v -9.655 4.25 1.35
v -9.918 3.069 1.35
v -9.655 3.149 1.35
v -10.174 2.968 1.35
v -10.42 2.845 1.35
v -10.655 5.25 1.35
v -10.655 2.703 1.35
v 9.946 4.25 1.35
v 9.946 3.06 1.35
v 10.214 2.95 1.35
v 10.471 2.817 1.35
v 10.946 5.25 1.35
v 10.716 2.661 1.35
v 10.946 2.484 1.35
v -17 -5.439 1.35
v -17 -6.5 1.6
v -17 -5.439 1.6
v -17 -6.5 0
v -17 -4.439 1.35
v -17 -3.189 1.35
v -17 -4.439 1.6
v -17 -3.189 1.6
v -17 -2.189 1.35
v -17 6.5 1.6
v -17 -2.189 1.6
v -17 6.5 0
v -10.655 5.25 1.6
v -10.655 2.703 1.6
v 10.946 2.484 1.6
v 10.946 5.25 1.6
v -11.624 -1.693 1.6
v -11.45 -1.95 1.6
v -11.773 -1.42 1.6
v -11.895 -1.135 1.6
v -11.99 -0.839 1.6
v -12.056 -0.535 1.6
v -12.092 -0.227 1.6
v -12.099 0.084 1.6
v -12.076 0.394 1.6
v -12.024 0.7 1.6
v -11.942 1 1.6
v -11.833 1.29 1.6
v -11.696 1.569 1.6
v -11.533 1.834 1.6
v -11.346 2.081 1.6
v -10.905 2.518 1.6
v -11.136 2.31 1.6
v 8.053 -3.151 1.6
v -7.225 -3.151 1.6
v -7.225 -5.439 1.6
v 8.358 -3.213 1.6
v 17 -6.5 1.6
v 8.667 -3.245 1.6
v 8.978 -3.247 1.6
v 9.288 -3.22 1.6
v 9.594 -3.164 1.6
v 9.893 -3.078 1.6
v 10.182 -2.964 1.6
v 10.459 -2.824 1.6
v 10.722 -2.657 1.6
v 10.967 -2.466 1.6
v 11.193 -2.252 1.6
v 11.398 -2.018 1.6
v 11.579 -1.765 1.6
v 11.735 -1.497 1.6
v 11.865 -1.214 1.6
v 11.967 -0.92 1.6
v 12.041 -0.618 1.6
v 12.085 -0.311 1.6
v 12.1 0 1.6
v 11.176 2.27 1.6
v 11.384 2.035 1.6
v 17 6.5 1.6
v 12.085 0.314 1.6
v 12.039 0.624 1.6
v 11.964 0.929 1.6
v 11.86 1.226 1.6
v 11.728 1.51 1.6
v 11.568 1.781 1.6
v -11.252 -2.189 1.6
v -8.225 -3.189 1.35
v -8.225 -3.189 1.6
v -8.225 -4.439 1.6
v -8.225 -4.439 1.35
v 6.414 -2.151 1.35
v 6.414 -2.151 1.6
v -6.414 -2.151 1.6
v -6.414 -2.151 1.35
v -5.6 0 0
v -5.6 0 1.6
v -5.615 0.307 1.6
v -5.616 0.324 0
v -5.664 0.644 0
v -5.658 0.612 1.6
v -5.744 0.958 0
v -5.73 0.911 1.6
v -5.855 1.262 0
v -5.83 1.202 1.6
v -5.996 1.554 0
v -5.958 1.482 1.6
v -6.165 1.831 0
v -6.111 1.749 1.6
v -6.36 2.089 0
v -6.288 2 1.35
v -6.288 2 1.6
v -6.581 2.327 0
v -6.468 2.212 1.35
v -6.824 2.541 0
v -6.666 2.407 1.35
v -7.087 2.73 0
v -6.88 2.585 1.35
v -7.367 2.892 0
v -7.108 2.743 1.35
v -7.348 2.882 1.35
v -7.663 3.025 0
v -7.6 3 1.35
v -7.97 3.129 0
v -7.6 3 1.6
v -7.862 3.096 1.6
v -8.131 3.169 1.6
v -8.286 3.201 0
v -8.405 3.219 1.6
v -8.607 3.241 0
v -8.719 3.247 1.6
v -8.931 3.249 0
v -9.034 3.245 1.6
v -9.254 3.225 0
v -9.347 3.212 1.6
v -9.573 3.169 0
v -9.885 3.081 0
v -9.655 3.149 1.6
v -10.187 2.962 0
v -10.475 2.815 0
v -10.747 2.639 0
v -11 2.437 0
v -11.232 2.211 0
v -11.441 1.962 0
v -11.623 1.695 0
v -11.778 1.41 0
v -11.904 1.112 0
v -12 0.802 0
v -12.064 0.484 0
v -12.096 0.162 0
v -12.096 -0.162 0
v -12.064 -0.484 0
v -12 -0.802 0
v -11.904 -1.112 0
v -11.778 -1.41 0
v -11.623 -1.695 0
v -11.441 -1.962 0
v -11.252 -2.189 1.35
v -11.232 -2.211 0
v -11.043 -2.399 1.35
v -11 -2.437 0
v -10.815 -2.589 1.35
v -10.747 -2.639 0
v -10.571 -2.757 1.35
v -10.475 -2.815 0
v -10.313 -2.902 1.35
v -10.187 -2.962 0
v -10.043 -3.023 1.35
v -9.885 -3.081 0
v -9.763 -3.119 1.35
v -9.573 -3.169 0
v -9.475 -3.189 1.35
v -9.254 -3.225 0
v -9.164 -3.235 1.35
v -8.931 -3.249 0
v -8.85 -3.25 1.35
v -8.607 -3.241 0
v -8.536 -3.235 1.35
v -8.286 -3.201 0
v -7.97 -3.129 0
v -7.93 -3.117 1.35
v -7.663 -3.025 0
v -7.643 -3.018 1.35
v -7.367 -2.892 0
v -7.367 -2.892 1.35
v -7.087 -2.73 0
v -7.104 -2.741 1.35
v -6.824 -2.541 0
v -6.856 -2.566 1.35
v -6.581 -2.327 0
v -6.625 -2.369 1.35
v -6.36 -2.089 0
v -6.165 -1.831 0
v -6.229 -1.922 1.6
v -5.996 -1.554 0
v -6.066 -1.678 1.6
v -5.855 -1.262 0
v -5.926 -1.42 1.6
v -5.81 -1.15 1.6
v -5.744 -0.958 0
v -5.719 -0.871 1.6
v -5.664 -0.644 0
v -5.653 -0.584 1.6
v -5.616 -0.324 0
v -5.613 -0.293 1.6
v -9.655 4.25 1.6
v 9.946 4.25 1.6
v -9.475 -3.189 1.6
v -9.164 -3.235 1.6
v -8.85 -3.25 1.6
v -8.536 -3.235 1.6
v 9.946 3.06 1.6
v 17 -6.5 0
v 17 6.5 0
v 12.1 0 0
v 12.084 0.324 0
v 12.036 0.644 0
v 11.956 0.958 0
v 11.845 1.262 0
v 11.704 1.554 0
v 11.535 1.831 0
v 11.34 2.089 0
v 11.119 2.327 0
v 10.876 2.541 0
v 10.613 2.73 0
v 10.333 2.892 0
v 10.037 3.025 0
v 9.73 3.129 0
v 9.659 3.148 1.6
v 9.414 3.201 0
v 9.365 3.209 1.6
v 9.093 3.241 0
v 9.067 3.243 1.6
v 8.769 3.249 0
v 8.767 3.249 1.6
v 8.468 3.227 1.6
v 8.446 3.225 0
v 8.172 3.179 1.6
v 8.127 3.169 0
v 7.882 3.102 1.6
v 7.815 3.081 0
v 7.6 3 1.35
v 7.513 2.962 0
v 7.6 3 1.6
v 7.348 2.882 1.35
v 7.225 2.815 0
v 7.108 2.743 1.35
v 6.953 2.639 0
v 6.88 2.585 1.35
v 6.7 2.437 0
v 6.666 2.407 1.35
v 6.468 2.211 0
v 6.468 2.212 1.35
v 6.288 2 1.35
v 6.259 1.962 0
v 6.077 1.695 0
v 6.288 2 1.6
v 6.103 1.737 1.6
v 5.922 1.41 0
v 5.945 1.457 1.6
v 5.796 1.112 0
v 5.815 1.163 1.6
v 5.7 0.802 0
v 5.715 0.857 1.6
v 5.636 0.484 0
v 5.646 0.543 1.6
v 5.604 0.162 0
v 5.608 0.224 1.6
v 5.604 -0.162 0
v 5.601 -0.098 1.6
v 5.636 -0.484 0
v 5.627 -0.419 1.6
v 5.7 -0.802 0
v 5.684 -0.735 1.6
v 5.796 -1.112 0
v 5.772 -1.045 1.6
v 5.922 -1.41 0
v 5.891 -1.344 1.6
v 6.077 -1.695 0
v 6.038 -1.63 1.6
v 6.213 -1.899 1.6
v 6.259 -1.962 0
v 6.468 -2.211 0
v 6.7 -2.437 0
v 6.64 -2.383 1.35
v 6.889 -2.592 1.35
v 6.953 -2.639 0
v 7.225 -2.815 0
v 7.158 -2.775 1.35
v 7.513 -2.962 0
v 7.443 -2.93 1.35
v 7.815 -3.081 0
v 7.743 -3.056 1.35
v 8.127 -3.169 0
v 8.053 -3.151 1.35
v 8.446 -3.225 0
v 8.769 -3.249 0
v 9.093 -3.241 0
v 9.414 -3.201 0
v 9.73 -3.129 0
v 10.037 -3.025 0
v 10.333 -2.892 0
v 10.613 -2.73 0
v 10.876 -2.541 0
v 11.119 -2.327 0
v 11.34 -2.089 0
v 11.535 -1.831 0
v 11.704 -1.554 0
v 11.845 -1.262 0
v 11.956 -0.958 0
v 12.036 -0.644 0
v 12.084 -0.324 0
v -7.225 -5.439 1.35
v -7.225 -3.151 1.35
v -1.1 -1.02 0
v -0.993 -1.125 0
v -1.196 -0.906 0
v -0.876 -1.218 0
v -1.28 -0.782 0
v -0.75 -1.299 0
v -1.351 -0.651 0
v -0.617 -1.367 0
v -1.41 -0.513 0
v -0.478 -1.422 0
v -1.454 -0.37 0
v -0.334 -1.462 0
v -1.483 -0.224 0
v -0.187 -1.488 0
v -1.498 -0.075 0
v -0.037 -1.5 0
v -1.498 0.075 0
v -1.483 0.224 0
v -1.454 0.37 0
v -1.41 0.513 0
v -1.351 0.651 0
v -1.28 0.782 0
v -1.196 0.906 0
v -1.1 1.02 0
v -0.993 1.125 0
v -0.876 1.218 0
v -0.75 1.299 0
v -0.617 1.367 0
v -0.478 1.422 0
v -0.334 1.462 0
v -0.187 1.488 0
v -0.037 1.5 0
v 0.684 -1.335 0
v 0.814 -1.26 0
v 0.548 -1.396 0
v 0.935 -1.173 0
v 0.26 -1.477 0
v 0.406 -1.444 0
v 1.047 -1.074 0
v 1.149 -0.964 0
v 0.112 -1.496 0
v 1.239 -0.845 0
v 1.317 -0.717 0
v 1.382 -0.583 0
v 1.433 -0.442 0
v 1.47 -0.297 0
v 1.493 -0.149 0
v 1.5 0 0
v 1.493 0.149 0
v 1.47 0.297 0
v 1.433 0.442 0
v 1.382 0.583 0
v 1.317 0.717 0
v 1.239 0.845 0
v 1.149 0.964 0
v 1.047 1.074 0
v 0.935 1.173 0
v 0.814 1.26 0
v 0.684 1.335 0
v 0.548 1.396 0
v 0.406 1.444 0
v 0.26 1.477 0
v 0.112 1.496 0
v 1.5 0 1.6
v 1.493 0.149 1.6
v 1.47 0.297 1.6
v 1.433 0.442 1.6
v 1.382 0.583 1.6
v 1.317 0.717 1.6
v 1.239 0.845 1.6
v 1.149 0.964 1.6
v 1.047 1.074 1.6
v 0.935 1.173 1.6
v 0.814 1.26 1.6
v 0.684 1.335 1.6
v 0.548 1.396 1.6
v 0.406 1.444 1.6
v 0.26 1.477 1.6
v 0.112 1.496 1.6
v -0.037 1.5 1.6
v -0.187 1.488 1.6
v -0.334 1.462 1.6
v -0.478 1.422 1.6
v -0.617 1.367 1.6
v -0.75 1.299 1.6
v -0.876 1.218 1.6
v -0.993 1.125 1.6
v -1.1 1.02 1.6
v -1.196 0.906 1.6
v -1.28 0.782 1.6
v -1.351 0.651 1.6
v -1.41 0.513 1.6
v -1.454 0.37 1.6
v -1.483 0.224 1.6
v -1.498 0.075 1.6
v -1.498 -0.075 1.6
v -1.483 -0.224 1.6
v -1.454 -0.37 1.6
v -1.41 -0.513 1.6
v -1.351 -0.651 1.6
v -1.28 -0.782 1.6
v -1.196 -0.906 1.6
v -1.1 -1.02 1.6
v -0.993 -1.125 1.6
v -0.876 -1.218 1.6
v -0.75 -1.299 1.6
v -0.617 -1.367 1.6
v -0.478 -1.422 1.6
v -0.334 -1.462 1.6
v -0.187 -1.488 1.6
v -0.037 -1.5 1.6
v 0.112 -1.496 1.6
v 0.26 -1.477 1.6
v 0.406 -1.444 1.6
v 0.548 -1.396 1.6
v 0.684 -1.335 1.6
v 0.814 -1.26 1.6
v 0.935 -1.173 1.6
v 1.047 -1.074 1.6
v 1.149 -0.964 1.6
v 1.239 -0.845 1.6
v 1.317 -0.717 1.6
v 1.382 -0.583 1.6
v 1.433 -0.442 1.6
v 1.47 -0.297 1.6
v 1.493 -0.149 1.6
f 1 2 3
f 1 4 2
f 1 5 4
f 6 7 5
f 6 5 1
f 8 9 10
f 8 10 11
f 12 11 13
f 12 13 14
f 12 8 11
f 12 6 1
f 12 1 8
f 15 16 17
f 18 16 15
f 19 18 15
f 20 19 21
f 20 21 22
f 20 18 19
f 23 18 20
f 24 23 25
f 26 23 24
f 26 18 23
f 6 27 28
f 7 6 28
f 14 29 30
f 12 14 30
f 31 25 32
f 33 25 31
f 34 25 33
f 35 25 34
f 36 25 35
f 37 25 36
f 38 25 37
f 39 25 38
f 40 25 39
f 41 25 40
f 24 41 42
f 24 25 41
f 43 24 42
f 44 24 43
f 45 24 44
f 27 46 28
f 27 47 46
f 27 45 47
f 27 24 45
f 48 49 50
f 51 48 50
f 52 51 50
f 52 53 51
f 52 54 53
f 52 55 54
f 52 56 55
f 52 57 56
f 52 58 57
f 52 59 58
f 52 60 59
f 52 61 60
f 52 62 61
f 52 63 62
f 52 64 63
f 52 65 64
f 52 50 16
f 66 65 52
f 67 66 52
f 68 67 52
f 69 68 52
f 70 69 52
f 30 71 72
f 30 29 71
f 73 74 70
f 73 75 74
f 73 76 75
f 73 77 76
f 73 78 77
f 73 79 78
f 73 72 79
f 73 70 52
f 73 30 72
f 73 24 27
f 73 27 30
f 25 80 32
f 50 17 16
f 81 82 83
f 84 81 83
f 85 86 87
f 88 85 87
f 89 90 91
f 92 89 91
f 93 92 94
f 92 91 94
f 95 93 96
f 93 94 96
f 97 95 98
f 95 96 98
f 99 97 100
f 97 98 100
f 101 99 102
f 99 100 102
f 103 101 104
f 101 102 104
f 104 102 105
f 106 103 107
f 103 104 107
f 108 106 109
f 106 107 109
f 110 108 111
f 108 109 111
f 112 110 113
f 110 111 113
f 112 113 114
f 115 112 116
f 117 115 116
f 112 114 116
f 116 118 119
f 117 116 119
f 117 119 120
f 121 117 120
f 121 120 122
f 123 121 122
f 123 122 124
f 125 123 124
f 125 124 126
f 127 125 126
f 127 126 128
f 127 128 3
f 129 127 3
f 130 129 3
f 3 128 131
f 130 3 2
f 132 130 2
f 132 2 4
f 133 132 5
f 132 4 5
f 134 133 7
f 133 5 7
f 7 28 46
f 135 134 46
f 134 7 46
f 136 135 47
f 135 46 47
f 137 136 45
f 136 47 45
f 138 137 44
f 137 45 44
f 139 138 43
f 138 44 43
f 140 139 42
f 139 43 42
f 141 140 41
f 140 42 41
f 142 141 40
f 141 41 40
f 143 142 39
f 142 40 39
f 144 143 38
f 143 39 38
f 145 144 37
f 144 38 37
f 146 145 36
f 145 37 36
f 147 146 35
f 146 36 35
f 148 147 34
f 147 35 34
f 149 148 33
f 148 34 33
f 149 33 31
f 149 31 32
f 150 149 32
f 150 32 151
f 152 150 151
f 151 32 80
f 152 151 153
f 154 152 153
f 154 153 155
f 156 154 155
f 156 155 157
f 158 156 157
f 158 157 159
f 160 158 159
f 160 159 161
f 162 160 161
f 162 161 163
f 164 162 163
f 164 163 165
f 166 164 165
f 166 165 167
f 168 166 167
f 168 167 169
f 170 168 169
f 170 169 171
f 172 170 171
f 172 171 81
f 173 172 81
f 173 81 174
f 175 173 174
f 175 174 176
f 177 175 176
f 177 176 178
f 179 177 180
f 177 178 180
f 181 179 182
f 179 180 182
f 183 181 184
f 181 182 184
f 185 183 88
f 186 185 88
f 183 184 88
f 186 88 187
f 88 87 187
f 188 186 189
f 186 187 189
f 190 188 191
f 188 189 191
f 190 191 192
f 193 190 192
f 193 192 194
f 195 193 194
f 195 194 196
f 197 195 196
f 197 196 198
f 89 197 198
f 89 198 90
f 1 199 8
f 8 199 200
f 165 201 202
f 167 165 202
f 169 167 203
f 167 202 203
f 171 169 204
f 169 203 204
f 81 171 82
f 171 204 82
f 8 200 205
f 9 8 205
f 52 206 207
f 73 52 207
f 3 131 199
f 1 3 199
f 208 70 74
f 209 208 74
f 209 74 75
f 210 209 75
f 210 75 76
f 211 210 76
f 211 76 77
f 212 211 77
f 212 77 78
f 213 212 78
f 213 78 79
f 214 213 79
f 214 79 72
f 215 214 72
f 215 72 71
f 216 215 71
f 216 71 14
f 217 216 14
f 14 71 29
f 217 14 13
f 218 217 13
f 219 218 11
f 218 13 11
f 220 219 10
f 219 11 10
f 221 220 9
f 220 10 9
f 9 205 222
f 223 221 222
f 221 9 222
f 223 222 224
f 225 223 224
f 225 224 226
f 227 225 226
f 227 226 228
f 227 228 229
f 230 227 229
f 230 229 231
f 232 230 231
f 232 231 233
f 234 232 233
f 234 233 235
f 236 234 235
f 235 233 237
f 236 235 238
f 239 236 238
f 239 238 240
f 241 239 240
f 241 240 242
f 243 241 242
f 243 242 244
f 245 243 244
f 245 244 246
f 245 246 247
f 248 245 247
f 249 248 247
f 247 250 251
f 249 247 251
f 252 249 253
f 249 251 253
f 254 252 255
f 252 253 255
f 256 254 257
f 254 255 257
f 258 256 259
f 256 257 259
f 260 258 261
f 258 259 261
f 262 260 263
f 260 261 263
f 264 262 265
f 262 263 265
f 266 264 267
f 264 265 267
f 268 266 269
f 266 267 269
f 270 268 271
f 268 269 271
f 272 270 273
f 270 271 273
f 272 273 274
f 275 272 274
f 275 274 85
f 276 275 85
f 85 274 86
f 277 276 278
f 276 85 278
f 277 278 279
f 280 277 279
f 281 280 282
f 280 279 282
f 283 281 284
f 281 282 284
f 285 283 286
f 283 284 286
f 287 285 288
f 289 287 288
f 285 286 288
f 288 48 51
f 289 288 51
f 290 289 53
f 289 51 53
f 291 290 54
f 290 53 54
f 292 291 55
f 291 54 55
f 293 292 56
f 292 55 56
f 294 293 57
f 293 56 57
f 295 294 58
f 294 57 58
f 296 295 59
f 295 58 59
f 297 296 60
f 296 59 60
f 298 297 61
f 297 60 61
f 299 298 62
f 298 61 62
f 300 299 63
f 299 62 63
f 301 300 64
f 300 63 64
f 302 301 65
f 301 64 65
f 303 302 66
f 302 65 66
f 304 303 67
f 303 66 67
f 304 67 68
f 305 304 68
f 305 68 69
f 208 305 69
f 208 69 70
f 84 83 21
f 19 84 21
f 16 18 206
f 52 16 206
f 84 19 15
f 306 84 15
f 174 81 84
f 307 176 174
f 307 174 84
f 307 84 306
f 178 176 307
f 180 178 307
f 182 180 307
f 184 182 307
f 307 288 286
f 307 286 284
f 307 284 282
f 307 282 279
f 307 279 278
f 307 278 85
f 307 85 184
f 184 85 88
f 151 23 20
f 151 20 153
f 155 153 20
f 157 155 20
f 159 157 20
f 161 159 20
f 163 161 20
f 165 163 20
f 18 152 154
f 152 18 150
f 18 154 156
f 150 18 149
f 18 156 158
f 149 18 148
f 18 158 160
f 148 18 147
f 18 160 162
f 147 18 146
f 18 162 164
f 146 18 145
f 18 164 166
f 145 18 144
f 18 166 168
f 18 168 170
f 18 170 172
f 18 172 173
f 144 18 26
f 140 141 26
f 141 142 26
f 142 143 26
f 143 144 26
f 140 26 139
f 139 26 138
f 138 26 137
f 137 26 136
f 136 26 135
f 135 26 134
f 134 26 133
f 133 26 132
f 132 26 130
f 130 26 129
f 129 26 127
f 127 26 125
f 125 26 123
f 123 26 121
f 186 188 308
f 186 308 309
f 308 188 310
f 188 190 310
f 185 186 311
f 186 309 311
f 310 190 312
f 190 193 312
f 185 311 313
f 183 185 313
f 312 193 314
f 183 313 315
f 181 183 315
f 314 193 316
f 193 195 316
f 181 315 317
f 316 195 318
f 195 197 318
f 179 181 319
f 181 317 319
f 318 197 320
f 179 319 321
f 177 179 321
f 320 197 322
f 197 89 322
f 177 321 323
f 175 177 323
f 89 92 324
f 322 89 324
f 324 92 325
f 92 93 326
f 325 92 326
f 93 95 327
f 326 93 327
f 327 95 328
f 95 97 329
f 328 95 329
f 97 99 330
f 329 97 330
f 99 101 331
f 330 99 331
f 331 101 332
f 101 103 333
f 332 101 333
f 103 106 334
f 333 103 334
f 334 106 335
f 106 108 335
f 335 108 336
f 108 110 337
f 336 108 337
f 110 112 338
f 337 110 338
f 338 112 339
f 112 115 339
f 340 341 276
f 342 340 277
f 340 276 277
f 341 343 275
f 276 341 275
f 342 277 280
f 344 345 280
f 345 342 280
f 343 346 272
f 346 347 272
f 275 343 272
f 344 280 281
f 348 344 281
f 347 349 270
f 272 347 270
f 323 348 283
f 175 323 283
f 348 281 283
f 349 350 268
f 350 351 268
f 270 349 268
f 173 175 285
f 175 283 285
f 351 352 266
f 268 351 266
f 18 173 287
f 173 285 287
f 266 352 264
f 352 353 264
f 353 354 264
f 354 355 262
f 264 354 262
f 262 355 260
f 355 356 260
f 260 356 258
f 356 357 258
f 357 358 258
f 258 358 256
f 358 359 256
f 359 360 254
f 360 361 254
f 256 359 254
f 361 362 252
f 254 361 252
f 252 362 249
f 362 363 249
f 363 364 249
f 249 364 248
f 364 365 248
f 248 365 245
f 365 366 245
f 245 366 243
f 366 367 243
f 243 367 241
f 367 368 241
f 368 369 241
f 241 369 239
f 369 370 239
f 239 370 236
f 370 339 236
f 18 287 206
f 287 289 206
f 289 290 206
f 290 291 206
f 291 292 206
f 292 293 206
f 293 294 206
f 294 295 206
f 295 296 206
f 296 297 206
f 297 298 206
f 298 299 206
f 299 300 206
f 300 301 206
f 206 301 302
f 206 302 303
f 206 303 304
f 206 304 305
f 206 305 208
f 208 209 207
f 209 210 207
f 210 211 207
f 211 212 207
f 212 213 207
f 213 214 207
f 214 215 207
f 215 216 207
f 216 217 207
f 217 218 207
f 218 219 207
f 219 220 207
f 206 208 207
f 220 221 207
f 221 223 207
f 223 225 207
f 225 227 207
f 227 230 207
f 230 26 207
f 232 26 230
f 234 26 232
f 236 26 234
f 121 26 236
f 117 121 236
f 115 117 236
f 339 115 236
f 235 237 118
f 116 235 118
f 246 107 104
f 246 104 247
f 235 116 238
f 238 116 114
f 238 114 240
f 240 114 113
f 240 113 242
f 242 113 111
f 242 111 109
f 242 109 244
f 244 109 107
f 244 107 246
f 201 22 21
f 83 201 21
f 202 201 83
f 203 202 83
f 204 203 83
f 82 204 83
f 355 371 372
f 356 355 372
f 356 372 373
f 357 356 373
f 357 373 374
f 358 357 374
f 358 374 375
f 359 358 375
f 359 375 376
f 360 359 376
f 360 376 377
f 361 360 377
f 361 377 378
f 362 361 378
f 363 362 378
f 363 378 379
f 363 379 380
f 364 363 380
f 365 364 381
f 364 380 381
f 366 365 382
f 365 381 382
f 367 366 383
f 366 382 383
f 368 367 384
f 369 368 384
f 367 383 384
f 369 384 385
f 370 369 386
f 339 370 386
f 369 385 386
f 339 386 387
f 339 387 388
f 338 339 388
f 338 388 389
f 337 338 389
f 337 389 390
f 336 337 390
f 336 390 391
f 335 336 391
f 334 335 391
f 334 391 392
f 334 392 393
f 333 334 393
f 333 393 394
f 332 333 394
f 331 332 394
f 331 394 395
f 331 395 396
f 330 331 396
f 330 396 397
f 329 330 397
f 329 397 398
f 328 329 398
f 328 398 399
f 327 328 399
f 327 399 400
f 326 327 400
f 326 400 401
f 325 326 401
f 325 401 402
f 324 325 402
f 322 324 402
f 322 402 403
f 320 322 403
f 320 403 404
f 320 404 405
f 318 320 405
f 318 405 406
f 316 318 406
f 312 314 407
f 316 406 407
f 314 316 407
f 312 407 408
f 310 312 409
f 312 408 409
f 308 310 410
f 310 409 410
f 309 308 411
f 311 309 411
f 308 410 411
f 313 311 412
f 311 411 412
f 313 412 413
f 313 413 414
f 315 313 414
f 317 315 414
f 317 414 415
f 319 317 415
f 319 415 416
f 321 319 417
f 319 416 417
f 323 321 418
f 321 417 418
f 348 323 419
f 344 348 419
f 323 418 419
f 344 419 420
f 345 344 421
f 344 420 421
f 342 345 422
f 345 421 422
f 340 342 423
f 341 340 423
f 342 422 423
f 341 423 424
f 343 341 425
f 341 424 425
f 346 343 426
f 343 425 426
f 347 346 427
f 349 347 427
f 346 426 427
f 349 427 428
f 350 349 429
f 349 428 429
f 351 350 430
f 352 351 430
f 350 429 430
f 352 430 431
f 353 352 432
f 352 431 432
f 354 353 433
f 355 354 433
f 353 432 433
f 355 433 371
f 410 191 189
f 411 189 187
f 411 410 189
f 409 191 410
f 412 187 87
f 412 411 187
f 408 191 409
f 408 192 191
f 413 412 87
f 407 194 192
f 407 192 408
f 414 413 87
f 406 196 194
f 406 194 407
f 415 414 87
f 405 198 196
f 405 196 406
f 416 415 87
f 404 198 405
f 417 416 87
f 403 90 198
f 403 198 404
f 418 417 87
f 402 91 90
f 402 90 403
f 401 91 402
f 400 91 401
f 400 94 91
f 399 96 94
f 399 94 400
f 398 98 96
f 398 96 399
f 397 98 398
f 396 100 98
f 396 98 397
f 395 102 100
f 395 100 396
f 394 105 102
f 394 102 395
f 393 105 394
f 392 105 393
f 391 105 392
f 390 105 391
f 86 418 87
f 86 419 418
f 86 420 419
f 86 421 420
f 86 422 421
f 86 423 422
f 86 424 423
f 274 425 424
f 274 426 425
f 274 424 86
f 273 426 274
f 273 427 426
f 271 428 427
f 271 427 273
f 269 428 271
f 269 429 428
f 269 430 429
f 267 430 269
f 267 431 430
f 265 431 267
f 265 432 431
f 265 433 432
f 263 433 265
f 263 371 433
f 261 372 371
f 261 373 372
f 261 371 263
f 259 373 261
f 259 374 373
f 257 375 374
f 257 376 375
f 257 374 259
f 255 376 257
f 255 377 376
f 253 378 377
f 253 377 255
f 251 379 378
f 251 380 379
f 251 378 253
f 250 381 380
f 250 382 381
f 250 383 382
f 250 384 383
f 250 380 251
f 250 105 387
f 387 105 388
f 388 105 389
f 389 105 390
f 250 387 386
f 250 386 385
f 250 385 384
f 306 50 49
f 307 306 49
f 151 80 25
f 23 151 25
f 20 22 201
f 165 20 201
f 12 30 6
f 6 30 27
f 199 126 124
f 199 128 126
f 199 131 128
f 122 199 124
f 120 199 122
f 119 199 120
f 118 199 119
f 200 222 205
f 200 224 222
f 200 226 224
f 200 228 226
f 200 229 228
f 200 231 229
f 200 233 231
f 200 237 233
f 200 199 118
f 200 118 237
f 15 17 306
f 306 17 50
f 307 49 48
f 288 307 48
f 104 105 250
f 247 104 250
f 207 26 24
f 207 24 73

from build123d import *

# Parameters (mm, degrees)
F0_W     = 34
F0_H     = 13
F1_DEPTH = 1.6
F2_R     = 3.25
F3_DEPTH = 1.601
F4_R     = 1.5
F5_DEPTH = 1.601
F7_DEPTH = 0.25


with BuildPart() as f1:
    # F0 (on Top) → F1 (new body)
    with BuildSketch(Plane.XY):
        Rectangle(F0_W, F0_H)
    extrude(amount=F1_DEPTH)

    # F2 (on face) → F3 (cut, through all)
    with BuildSketch(Plane.XY.offset(1.6)):
        with Locations((-8.85, 0)):
            Circle(F2_R)
        with Locations((8.85, 0)):
            Circle(F2_R)
    extrude(amount=-F3_DEPTH, mode=Mode.SUBTRACT)

    # F4 (on face) → F5 (cut, through all)
    with BuildSketch(Plane.XY.offset(1.6)):
        Circle(F4_R)
    extrude(amount=-F5_DEPTH, mode=Mode.SUBTRACT)

    # F6 (on face) → F7 (cut)
    with BuildSketch(Plane.XY.offset(1.6)):
        with BuildLine():
            ThreePointArc((-10.6551859497, 2.7025550294), (-10.1741098428, 2.9680352296), (-9.6551859497, 3.1486783873))
            Line((-9.6551859497, 3.1486783873), (-9.6551859497, 4.25))
            Line((-9.6551859497, 4.25), (9.9456183744, 4.25))
            Line((9.9456183744, 4.25), (9.9456183744, 3.0597582221))
            ThreePointArc((9.9456183744, 3.0597582221), (10.4713685624, 2.8166760525), (10.9456183744, 2.4841263311))
            Line((10.9456183744, 2.4841263311), (10.9456183744, 5.25))
            Line((10.9456183744, 5.25), (-10.6551859497, 5.25))
            Line((-10.6551859497, 5.25), (-10.6551859497, 2.7025550294))
        make_face()
        with BuildLine():
            ThreePointArc((-8.4051859497, 3.2194161677), (-9.0336244397, 3.244808479), (-9.6551859497, 3.1486783873))
            ThreePointArc((-9.6551859497, 3.1486783873), (-10.1741098428, 2.9680352296), (-10.6551859497, 2.7025550294))
            ThreePointArc((-10.6551859497, 2.7025550294), (-12.0760849491, 0.3935427562), (-11.2519368041, -2.1893377055))
            ThreePointArc((-11.2519368041, -2.1893377055), (-10.4439217685, -2.8322982534), (-9.475, -3.1893377055))
            ThreePointArc((-9.475, -3.1893377055), (-8.85, -3.25), (-8.225, -3.1893377055))
            ThreePointArc((-8.225, -3.1893377055), (-7.7095021463, -3.0433147464), (-7.225, -2.8145825623))
            ThreePointArc((-7.225, -2.8145825623), (-6.7923319785, -2.5156514689), (-6.4135405563, -2.1508522448))
            ThreePointArc((-6.4135405563, -2.1508522448), (-5.8101814863, -1.1497840684), (-5.6, 0))
            ThreePointArc((-5.6, 0), (-5.7768788262, 1.0575567367), (-6.2882623085, 2))
            ThreePointArc((-6.2882623085, 2), (-6.8796355522, 2.5846013122), (-7.6, 3))
            Line((-7.6, 3), (-8.4051859497, 3))
            Line((-8.4051859497, 3), (-8.4051859497, 3.2194161677))
        make_face()
        with BuildLine():
            Line((7.6, 3), (-7.6, 3))
            ThreePointArc((-7.6, 3), (-6.8796355522, 2.5846013122), (-6.2882623085, 2))
            Line((-6.2882623085, 2), (6.2882623085, 2))
            ThreePointArc((6.2882623085, 2), (6.8796355522, 2.5846013122), (7.6, 3))
        make_face()
        with BuildLine():
            ThreePointArc((8.0533632375, -3.1508522448), (7.1578925065, -2.774756247), (6.4135405563, -2.1508522448))
            Line((6.4135405563, -2.1508522448), (-6.4135405563, -2.1508522448))
            ThreePointArc((-6.4135405563, -2.1508522448), (-6.7923319785, -2.5156514689), (-7.225, -2.8145825623))
            Line((-7.225, -2.8145825623), (-7.225, -3.1508522448))
            Line((-7.225, -3.1508522448), (8.0533632375, -3.1508522448))
        make_face()
        with BuildLine():
            ThreePointArc((-7.225, -2.8145825623), (-7.7095021463, -3.0433147464), (-8.225, -3.1893377055))
            Line((-8.225, -3.1893377055), (-8.225, -4.4393377055))
            Line((-8.225, -4.4393377055), (-17, -4.4393377055))
            Line((-17, -4.4393377055), (-17, -5.4393377055))
            Line((-17, -5.4393377055), (-7.225, -5.4393377055))
            Line((-7.225, -5.4393377055), (-7.225, -3.1508522448))
            Line((-7.225, -3.1508522448), (-7.225, -2.8145825623))
        make_face()
        with BuildLine():
            ThreePointArc((-9.475, -3.1893377055), (-10.4439217685, -2.8322982534), (-11.2519368041, -2.1893377055))
            Line((-11.2519368041, -2.1893377055), (-17, -2.1893377055))
            Line((-17, -2.1893377055), (-17, -3.1893377055))
            Line((-17, -3.1893377055), (-9.475, -3.1893377055))
        make_face()
    extrude(amount=-F7_DEPTH, mode=Mode.SUBTRACT)


solid = f1.part
